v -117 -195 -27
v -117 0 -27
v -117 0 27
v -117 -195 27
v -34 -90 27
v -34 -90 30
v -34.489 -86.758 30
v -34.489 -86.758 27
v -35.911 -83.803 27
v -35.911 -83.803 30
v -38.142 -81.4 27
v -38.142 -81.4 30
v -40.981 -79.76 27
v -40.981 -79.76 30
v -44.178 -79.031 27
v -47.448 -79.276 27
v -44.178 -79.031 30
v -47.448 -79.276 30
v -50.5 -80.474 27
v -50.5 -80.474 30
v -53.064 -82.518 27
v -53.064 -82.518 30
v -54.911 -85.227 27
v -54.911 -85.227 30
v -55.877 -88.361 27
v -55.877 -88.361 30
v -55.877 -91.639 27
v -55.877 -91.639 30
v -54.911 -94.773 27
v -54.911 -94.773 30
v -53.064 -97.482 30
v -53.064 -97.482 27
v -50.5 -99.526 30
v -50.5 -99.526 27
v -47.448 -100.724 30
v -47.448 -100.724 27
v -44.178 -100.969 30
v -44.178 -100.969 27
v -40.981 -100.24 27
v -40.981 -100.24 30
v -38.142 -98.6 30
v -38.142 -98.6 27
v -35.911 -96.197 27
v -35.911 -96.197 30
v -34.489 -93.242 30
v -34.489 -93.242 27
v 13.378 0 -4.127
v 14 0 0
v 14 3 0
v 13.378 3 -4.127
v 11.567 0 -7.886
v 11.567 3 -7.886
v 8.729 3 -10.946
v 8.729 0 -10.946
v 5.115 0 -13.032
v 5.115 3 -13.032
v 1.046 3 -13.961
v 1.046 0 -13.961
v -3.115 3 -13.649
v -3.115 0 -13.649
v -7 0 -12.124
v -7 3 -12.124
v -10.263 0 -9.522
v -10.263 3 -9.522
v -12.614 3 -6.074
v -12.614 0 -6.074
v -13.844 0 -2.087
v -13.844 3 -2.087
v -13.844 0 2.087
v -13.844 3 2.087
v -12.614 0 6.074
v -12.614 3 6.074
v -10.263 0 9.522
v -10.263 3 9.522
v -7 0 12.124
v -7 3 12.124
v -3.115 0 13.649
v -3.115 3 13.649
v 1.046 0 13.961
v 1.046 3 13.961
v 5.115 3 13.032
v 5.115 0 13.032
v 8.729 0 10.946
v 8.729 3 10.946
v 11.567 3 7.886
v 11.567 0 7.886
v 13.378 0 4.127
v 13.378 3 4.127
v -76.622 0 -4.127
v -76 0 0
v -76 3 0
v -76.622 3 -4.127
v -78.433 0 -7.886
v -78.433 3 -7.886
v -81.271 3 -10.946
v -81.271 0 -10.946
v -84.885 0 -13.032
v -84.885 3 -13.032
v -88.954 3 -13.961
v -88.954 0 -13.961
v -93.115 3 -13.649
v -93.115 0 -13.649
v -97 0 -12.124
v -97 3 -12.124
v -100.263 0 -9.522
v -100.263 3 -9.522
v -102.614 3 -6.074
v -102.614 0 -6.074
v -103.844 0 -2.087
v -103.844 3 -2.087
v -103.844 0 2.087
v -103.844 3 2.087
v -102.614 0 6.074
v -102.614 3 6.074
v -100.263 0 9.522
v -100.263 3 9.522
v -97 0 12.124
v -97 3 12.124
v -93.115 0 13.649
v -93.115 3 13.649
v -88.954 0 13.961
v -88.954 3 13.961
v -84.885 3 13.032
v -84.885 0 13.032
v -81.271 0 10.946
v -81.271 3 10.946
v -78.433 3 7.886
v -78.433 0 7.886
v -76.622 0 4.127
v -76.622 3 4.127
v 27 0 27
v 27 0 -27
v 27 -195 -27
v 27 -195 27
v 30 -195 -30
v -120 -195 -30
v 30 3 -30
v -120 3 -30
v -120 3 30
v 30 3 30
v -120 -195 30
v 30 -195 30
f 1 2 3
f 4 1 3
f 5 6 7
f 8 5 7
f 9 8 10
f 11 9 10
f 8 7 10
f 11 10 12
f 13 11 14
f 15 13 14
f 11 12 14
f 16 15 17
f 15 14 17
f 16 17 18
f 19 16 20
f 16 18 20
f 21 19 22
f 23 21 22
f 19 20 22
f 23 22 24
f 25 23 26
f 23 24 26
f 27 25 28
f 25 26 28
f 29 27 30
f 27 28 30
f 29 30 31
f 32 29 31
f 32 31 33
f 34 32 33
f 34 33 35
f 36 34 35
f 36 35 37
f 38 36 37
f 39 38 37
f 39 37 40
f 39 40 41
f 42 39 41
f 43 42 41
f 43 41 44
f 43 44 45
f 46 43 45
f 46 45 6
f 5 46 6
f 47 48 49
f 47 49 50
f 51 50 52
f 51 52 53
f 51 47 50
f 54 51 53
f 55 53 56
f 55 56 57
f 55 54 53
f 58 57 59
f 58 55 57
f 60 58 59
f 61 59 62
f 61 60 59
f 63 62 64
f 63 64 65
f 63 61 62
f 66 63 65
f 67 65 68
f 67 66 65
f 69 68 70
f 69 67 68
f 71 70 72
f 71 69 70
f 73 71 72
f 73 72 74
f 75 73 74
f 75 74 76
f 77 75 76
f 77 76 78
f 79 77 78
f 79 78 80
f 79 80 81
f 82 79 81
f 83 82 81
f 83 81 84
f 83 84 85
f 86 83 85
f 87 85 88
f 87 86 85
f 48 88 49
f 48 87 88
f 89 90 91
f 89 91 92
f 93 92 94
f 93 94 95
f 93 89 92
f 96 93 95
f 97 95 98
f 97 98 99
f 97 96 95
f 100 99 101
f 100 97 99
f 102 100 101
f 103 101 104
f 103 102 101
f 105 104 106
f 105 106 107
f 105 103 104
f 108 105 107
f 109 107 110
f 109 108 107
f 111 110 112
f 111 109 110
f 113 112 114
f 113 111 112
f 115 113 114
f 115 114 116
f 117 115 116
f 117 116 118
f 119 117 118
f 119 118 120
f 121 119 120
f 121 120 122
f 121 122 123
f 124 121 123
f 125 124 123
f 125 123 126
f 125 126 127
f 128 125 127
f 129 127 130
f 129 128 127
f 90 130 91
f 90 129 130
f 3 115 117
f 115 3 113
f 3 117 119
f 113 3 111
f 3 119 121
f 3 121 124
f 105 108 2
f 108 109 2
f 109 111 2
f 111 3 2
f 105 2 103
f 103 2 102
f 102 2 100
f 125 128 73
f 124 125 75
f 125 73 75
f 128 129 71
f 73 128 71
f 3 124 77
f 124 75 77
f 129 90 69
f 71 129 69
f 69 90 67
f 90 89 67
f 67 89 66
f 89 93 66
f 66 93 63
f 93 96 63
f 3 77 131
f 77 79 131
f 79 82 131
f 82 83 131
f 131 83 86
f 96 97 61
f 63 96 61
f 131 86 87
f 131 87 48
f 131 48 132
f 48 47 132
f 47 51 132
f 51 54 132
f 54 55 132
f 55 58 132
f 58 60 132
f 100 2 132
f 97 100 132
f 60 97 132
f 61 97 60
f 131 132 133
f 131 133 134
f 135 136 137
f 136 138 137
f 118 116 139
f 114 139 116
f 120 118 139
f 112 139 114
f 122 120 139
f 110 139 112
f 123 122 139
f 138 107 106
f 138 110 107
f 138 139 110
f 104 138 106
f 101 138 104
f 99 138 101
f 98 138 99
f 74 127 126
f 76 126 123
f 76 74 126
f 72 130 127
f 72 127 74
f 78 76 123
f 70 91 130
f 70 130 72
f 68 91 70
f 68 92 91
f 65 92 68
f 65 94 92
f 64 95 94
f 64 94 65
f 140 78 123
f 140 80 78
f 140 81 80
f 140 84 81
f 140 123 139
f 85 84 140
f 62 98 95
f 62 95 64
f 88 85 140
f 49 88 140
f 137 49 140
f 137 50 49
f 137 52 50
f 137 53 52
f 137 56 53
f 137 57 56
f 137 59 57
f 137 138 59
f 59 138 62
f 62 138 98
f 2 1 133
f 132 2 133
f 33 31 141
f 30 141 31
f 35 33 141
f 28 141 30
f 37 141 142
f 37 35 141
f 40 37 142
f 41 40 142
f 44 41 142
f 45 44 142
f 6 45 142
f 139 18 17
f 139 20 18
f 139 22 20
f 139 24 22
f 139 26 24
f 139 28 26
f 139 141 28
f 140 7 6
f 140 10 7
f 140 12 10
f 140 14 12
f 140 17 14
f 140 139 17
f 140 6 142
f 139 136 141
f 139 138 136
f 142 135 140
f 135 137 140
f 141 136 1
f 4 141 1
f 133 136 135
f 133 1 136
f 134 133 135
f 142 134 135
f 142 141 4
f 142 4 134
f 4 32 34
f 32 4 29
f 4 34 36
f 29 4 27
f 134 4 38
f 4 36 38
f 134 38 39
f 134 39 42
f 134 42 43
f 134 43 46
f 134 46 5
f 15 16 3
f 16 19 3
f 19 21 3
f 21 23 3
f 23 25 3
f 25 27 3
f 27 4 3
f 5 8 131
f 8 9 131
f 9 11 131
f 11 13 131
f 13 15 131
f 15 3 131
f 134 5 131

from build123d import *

# Parameters (mm, degrees)
CROQUIS1_W              = 240
CROQUIS1_H              = 60
CROQUIS1_R              = 14
SALIENTE_EXTRUIR1_DEPTH = 3
CROQUIS4_W              = 90
CROQUIS4_H              = 60
CORTAR_EXTRUIR2_DEPTH   = 5
CROQUIS2_W              = 150
CROQUIS2_H              = 60
CROQUIS2_W_2            = 144
CROQUIS2_H_2            = 54
SALIENTE_EXTRUIR2_DEPTH = 195
CROQUIS5_R              = 11
CORTAR_EXTRUIR3_DEPTH   = 5


with BuildPart() as part:
    # Croquis1 → Saliente-Extruir1 (new body)
    with BuildSketch(Plane(origin=(0, 0, 0), x_dir=(1, 0, 0), z_dir=(0, 1, 0))):
        Rectangle(CROQUIS1_W, CROQUIS1_H)
        Circle(CROQUIS1_R, mode=Mode.SUBTRACT)
        with Locations((-90, 0)):
            Circle(CROQUIS1_R, mode=Mode.SUBTRACT)
    extrude(amount=SALIENTE_EXTRUIR1_DEPTH)

    # Croquis4 → Cortar-Extruir2 (cut)
    with BuildSketch(Plane(origin=(0, 3, 0), x_dir=(1, 0, 0), z_dir=(0, 1, 0))):
        with Locations((75, 0)):
            Rectangle(CROQUIS4_W, CROQUIS4_H)
    extrude(amount=-CORTAR_EXTRUIR2_DEPTH, mode=Mode.SUBTRACT)

    # Croquis2 → Saliente-Extruir2 (add)
    with BuildSketch(Plane.XZ):
        with Locations((-45, 0)):
            Rectangle(CROQUIS2_W, CROQUIS2_H)
        with Locations((-45, 0)):
            Rectangle(CROQUIS2_W_2, CROQUIS2_H_2, mode=Mode.SUBTRACT)
    extrude(amount=SALIENTE_EXTRUIR2_DEPTH)

    # Croquis5 → Cortar-Extruir3 (cut)
    with BuildSketch(Plane.XY.offset(30)):
        with Locations((-45, -90)):
            Circle(CROQUIS5_R)
    extrude(amount=-CORTAR_EXTRUIR3_DEPTH, mode=Mode.SUBTRACT)


solid = part.part
